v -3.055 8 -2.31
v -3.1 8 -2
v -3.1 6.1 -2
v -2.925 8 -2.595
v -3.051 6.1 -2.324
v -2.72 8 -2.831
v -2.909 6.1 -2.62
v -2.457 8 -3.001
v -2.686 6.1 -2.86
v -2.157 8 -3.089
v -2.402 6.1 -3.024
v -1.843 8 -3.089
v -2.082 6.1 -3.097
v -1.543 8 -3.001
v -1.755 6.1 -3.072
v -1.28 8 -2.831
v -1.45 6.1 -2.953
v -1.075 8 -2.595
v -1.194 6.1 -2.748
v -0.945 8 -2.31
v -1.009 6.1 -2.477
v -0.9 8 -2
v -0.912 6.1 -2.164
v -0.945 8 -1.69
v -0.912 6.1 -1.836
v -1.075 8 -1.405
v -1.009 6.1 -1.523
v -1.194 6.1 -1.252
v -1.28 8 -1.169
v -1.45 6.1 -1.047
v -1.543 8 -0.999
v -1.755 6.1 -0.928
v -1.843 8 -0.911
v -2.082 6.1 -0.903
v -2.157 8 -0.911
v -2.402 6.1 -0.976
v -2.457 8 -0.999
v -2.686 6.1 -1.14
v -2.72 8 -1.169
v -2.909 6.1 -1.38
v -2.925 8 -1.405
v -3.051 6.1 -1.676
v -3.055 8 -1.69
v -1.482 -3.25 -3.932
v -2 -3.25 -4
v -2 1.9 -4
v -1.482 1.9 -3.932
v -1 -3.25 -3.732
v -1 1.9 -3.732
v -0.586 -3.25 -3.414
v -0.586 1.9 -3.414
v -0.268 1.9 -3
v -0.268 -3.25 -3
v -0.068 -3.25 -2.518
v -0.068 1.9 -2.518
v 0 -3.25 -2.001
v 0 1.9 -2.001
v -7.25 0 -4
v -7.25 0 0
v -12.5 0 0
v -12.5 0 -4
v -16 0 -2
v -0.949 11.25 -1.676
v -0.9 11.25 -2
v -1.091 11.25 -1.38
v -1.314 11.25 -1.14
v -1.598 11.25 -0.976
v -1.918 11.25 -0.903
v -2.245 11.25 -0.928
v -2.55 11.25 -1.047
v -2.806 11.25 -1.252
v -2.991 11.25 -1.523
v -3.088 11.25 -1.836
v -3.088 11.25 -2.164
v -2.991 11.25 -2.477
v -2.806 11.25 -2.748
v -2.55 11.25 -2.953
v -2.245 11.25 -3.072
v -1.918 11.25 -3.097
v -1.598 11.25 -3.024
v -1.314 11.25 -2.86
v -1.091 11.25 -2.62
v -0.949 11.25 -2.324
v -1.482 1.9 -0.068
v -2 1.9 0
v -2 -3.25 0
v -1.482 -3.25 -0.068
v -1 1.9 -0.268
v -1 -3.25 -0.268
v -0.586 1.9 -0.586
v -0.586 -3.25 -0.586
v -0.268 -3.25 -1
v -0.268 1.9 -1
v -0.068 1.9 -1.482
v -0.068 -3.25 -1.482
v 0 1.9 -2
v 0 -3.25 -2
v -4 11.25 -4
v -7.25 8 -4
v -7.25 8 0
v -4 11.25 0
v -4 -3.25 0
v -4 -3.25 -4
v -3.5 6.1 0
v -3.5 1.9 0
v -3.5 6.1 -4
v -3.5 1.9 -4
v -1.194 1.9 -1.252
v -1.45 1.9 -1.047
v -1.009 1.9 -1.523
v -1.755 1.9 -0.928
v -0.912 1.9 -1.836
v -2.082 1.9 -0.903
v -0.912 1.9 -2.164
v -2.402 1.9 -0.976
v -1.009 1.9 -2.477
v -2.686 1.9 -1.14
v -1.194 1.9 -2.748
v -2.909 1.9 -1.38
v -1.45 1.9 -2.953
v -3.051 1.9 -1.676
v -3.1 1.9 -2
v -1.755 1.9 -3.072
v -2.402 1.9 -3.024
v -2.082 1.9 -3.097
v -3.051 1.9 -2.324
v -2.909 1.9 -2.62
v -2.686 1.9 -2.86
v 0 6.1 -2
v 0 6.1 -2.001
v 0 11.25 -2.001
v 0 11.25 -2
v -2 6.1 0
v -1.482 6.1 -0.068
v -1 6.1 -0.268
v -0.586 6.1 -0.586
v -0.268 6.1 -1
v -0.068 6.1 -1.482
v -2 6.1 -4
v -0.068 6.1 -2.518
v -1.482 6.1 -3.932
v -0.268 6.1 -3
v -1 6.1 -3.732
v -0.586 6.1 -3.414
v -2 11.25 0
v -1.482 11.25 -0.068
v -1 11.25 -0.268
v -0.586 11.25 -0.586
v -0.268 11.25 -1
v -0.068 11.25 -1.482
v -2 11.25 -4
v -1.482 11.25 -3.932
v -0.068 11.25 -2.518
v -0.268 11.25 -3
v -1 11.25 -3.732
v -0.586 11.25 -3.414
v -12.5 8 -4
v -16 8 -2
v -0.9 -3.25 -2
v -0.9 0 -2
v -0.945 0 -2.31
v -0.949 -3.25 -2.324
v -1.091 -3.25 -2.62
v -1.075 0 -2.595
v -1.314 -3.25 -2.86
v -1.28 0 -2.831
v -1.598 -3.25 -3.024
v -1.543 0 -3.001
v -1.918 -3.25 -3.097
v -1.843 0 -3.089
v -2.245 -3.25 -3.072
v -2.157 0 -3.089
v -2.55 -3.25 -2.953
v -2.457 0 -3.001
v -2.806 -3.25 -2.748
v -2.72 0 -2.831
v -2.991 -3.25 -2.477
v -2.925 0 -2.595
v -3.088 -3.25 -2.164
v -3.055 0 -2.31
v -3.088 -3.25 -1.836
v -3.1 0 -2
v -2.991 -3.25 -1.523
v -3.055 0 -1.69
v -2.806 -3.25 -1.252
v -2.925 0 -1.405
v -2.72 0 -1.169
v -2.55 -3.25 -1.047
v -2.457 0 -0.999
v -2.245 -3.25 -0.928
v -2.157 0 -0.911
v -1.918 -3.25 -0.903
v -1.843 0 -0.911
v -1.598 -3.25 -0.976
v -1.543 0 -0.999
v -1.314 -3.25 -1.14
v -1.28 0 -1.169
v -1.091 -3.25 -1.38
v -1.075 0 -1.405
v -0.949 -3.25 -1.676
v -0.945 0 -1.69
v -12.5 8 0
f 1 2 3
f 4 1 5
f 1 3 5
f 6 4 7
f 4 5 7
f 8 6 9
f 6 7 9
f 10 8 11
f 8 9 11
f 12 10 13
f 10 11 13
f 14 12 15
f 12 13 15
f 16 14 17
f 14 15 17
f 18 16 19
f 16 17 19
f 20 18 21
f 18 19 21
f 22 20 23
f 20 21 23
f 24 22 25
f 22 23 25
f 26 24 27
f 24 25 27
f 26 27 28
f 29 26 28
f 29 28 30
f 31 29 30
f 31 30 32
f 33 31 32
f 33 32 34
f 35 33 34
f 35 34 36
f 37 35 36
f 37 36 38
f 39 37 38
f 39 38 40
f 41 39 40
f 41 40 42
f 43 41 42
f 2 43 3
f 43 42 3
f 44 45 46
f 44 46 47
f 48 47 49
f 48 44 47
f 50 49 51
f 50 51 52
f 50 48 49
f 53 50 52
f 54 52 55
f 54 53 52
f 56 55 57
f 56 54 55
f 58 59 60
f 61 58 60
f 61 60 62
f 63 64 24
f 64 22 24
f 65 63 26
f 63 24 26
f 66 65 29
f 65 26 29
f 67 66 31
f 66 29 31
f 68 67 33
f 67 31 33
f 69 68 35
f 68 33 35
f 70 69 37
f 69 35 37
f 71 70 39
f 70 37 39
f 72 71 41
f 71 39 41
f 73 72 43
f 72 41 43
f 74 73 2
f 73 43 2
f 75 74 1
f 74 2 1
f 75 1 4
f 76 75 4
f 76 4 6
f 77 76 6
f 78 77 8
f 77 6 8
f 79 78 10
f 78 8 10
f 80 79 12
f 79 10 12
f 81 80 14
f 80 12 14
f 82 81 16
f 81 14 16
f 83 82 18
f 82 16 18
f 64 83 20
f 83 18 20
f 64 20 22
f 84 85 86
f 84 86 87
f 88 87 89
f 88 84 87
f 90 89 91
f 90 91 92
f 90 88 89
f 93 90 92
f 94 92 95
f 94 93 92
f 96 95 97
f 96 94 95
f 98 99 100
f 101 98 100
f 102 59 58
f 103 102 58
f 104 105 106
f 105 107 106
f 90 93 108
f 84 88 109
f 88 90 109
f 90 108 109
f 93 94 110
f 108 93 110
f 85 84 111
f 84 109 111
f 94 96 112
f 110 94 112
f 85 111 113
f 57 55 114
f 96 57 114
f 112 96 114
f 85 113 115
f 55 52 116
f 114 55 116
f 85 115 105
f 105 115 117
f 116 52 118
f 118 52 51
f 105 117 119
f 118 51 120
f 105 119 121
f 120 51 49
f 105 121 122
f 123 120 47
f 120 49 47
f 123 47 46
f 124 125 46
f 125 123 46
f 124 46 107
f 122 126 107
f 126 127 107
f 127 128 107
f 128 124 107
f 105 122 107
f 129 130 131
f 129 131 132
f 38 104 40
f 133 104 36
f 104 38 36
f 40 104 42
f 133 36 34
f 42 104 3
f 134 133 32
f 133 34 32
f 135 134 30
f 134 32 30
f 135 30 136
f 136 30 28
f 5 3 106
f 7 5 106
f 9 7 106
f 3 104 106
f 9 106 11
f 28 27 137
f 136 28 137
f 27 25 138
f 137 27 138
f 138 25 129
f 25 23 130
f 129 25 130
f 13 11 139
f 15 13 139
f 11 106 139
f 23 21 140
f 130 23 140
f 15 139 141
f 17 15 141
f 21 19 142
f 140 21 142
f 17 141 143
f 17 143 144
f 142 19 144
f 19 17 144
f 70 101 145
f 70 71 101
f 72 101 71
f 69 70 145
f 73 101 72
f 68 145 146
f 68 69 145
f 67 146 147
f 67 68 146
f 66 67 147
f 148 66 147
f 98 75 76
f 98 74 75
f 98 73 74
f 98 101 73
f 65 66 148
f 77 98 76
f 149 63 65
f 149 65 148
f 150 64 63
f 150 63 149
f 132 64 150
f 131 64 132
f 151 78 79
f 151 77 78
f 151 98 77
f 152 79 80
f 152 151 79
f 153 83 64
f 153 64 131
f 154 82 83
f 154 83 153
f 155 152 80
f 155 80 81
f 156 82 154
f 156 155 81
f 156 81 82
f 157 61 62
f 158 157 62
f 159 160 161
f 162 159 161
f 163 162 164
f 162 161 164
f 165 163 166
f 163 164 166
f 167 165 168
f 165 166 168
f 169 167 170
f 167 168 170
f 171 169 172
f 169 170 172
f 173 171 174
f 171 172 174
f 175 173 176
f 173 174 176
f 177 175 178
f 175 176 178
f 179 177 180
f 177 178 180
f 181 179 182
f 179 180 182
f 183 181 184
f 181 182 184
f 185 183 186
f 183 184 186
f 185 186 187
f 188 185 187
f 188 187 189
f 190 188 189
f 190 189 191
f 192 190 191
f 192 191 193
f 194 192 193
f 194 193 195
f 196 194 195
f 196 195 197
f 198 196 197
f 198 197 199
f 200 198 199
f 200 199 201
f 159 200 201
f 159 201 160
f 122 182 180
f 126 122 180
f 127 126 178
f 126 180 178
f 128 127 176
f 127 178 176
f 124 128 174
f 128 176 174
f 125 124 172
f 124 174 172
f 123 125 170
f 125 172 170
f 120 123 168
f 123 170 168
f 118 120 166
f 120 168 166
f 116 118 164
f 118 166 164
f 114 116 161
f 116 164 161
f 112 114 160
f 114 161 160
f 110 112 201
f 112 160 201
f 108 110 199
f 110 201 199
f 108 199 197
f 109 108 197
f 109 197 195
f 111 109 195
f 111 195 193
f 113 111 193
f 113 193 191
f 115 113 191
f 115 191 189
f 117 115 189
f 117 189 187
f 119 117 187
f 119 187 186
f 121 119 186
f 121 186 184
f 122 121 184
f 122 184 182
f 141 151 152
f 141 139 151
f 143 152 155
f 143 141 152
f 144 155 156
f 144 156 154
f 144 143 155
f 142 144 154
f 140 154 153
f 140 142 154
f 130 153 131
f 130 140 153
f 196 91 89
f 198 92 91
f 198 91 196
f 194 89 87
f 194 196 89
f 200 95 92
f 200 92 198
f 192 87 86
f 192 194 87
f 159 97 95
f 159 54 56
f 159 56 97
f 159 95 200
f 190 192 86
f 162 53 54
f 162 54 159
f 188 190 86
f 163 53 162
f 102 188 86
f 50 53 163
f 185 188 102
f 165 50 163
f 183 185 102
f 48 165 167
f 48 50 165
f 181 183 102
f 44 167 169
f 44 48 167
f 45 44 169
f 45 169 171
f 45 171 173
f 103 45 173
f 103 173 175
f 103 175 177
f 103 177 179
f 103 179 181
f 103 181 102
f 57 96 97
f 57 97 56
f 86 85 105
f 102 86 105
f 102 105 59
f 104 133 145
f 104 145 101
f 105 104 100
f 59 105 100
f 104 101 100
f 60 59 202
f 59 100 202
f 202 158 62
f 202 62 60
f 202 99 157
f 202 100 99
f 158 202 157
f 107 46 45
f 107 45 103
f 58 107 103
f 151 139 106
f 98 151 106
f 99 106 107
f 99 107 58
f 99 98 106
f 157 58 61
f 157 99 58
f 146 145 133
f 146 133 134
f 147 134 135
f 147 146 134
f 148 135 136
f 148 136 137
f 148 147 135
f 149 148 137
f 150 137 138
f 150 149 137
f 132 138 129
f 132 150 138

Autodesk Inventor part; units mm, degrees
ref_plane "YZ Plane" through (0, 0, 0) normal (1, 0, 0) x (0, 1, 0)
sketch "Sketch1" plane through (0, 0, 0) normal (0, 1, 0) x (-1, 0, 0)
  line L0 (0, 0) -> (18, 0)
  line L1 (18, 0) -> (18, -4)
  line L2 (18, -4) -> (0, -4)
  line L3 (0, -4) -> (0, 0)
  line L4 (18, -2) -> (16, -2)
  line L5 (9, -4) -> (9, -3)
  circle A0 centre (16, -2) radius 1.1
  circle A1 centre (2, -2) radius 1.1
  dimension "d0" = 18
  dimension "d1" = 4
  dimension "d2" = 2
  dimension "d3" = 2.2
extrude "Extrusion1" add sketch "Sketch1" along normal blind 8 contours A0 | L0 L1 L2 L3 | A1
sketch "Sketch2" plane through (0, 0, -4) normal (0, 0, -1) x (-1, 0, 0)
  line L0 (18, 0) -> (18, 8) projected
  line L1 (18, 8) -> (18, 6.1)
  line L2 (18, 0) -> (0, 0) projected
  line L3 (18, 0) -> (18, 1.9)
  line L4 (18, 6.1) -> (14.5, 6.1)
  line L5 (14.5, 6.1) -> (14.5, 1.9)
  line L6 (14.5, 1.9) -> (18, 1.9)
  line L7 (18, 1.9) -> (18, 6.1)
  dimension "d6" = 1.9
  dimension "d7" = 1.9
  dimension "d8" = 3.5
extrude "Extrusion2" cut sketch "Sketch2" against normal blind 8
ref_plane "Work Plane1" through (-9, 0, 0) normal (1, 0, 0) x (0, 0, -1)
mirror "Mirror1" about plane through (-9, 0, 0) normal (1, 0, 0) of "Extrusion2"
extrude "Extrusion3" cut sketch "Sketch1" along normal blind 8 contours A0 | A1
sketch "Sketch4" plane through (0, 8, 0) normal (0, 1, 0) x (1, 0, 0)
  line L0 (-18, 0) -> (0, 0) projected
  line L1 (0, 0) -> (-4, 0)
  line L2 (-4, 0) -> (-4, 4)
  line L3 (-4, 4) -> (0, 4)
  line L4 (0, 4) -> (0, 0)
  circle A0 centre (-2, 2) radius 1.1 projected
  circle A1 centre (-2, 2) radius 1.1
  dimension "d14" = 4
  dimension "d15" = 4
  dimension "d16" = 2.2
extrude "Extrusion4" add sketch "Sketch4" along normal blind 3.25
ref_plane "Work Plane2" through (-3.5, 4, 0) normal (0, 1, 0) x (1, 0, 0)
mirror "Mirror2" about plane through (-3.5, 4, 0) normal (0, 1, 0) of "Extrusion4"
fillet "Fillet2" radius 2 8 edges at (0, 8.675, -4) (0, -0.675, -4) (0, -0.675, 0) (0, 8.675, 0) (-18, 7.05, -4) (-18, 0.95, -4) (-18, 7.05, 0) (-18, 0.95, 0)
chamfer "Chamfer1" distance 3.25 angle 45 2 edges at (-4, 8, -2) (-4, 0, -2)
sketch "Sketch5" plane through (-14.5, 1.9, 0) normal (0, 0, 1) x (1, 0, 0)
  line L0 (0, 0) -> (-1.5, 0) projected
  line L1 (0, 0) -> (-4.1729, 0)
  line L2 (-4.1729, 0) -> (-4.1729, 7.3414)
  line L3 (-4.1729, 7.3414) -> (0, 7.3414)
  line L4 (0, 7.3414) -> (0, 0)
  line L5 (0, 0) -> (-4.2733, 0)
  line L6 (-4.2733, 0) -> (-4.2733, -4.4882)
  line L7 (-4.2733, -4.4882) -> (0, -4.4882)
  line L8 (0, -4.4882) -> (0, 0)
  point P0 (14.5, -1.9)
extrude "Extrusion5" cut sketch "Sketch5" against normal blind 10
sketch "Sketch6" plane through (0, 0, 0) normal (0, -1, 0) x (1, 0, 0)
  line L0 (-14.5, 0) -> (-14.5, -4) projected
  line L1 (-14.5, -2) -> (-16, -2)
  line L2 (-14.5, 0) -> (-7.25, 0) projected
  line L3 (-7.25, -4) -> (-14.5, -4) projected
  line L4 (-14.5, 0) -> (-12.5, 0)
  line L5 (-12.5, 0) -> (-12.5, -4)
  line L6 (-12.5, -4) -> (-14.5, -4)
  line L7 (-14.5, -4) -> (-14.5, 0)
  point P0 (0, 0)
  dimension "d25" = 1.5
  dimension "d26" = 2
extrude "Extrusion6" cut sketch "Sketch6" against normal blind 10
sketch "Sketch7" plane through (0, 0, 0) normal (0, -1, 0) x (1, 0, 0)
  line L0 (-12.5, 0) -> (-12.5, -4) projected
  line L1 (-12.5, -2) -> (-16, -2)
  line L2 (-12.5, 0) -> (-7.25, 0) projected
  line L3 (-16, -2) -> (-12.5, 0)
  line L4 (-7.25, -4) -> (-12.5, -4) projected
  line L5 (-12.5, 0) -> (-12.5, -4)
  line L6 (-12.5, -4) -> (-16, -2)
  point P0 (0, 0)
  dimension "d29" = 3.5
extrude "Extrusion7" add sketch "Sketch7" against normal blind 8
properties part number "short_link_v3"
